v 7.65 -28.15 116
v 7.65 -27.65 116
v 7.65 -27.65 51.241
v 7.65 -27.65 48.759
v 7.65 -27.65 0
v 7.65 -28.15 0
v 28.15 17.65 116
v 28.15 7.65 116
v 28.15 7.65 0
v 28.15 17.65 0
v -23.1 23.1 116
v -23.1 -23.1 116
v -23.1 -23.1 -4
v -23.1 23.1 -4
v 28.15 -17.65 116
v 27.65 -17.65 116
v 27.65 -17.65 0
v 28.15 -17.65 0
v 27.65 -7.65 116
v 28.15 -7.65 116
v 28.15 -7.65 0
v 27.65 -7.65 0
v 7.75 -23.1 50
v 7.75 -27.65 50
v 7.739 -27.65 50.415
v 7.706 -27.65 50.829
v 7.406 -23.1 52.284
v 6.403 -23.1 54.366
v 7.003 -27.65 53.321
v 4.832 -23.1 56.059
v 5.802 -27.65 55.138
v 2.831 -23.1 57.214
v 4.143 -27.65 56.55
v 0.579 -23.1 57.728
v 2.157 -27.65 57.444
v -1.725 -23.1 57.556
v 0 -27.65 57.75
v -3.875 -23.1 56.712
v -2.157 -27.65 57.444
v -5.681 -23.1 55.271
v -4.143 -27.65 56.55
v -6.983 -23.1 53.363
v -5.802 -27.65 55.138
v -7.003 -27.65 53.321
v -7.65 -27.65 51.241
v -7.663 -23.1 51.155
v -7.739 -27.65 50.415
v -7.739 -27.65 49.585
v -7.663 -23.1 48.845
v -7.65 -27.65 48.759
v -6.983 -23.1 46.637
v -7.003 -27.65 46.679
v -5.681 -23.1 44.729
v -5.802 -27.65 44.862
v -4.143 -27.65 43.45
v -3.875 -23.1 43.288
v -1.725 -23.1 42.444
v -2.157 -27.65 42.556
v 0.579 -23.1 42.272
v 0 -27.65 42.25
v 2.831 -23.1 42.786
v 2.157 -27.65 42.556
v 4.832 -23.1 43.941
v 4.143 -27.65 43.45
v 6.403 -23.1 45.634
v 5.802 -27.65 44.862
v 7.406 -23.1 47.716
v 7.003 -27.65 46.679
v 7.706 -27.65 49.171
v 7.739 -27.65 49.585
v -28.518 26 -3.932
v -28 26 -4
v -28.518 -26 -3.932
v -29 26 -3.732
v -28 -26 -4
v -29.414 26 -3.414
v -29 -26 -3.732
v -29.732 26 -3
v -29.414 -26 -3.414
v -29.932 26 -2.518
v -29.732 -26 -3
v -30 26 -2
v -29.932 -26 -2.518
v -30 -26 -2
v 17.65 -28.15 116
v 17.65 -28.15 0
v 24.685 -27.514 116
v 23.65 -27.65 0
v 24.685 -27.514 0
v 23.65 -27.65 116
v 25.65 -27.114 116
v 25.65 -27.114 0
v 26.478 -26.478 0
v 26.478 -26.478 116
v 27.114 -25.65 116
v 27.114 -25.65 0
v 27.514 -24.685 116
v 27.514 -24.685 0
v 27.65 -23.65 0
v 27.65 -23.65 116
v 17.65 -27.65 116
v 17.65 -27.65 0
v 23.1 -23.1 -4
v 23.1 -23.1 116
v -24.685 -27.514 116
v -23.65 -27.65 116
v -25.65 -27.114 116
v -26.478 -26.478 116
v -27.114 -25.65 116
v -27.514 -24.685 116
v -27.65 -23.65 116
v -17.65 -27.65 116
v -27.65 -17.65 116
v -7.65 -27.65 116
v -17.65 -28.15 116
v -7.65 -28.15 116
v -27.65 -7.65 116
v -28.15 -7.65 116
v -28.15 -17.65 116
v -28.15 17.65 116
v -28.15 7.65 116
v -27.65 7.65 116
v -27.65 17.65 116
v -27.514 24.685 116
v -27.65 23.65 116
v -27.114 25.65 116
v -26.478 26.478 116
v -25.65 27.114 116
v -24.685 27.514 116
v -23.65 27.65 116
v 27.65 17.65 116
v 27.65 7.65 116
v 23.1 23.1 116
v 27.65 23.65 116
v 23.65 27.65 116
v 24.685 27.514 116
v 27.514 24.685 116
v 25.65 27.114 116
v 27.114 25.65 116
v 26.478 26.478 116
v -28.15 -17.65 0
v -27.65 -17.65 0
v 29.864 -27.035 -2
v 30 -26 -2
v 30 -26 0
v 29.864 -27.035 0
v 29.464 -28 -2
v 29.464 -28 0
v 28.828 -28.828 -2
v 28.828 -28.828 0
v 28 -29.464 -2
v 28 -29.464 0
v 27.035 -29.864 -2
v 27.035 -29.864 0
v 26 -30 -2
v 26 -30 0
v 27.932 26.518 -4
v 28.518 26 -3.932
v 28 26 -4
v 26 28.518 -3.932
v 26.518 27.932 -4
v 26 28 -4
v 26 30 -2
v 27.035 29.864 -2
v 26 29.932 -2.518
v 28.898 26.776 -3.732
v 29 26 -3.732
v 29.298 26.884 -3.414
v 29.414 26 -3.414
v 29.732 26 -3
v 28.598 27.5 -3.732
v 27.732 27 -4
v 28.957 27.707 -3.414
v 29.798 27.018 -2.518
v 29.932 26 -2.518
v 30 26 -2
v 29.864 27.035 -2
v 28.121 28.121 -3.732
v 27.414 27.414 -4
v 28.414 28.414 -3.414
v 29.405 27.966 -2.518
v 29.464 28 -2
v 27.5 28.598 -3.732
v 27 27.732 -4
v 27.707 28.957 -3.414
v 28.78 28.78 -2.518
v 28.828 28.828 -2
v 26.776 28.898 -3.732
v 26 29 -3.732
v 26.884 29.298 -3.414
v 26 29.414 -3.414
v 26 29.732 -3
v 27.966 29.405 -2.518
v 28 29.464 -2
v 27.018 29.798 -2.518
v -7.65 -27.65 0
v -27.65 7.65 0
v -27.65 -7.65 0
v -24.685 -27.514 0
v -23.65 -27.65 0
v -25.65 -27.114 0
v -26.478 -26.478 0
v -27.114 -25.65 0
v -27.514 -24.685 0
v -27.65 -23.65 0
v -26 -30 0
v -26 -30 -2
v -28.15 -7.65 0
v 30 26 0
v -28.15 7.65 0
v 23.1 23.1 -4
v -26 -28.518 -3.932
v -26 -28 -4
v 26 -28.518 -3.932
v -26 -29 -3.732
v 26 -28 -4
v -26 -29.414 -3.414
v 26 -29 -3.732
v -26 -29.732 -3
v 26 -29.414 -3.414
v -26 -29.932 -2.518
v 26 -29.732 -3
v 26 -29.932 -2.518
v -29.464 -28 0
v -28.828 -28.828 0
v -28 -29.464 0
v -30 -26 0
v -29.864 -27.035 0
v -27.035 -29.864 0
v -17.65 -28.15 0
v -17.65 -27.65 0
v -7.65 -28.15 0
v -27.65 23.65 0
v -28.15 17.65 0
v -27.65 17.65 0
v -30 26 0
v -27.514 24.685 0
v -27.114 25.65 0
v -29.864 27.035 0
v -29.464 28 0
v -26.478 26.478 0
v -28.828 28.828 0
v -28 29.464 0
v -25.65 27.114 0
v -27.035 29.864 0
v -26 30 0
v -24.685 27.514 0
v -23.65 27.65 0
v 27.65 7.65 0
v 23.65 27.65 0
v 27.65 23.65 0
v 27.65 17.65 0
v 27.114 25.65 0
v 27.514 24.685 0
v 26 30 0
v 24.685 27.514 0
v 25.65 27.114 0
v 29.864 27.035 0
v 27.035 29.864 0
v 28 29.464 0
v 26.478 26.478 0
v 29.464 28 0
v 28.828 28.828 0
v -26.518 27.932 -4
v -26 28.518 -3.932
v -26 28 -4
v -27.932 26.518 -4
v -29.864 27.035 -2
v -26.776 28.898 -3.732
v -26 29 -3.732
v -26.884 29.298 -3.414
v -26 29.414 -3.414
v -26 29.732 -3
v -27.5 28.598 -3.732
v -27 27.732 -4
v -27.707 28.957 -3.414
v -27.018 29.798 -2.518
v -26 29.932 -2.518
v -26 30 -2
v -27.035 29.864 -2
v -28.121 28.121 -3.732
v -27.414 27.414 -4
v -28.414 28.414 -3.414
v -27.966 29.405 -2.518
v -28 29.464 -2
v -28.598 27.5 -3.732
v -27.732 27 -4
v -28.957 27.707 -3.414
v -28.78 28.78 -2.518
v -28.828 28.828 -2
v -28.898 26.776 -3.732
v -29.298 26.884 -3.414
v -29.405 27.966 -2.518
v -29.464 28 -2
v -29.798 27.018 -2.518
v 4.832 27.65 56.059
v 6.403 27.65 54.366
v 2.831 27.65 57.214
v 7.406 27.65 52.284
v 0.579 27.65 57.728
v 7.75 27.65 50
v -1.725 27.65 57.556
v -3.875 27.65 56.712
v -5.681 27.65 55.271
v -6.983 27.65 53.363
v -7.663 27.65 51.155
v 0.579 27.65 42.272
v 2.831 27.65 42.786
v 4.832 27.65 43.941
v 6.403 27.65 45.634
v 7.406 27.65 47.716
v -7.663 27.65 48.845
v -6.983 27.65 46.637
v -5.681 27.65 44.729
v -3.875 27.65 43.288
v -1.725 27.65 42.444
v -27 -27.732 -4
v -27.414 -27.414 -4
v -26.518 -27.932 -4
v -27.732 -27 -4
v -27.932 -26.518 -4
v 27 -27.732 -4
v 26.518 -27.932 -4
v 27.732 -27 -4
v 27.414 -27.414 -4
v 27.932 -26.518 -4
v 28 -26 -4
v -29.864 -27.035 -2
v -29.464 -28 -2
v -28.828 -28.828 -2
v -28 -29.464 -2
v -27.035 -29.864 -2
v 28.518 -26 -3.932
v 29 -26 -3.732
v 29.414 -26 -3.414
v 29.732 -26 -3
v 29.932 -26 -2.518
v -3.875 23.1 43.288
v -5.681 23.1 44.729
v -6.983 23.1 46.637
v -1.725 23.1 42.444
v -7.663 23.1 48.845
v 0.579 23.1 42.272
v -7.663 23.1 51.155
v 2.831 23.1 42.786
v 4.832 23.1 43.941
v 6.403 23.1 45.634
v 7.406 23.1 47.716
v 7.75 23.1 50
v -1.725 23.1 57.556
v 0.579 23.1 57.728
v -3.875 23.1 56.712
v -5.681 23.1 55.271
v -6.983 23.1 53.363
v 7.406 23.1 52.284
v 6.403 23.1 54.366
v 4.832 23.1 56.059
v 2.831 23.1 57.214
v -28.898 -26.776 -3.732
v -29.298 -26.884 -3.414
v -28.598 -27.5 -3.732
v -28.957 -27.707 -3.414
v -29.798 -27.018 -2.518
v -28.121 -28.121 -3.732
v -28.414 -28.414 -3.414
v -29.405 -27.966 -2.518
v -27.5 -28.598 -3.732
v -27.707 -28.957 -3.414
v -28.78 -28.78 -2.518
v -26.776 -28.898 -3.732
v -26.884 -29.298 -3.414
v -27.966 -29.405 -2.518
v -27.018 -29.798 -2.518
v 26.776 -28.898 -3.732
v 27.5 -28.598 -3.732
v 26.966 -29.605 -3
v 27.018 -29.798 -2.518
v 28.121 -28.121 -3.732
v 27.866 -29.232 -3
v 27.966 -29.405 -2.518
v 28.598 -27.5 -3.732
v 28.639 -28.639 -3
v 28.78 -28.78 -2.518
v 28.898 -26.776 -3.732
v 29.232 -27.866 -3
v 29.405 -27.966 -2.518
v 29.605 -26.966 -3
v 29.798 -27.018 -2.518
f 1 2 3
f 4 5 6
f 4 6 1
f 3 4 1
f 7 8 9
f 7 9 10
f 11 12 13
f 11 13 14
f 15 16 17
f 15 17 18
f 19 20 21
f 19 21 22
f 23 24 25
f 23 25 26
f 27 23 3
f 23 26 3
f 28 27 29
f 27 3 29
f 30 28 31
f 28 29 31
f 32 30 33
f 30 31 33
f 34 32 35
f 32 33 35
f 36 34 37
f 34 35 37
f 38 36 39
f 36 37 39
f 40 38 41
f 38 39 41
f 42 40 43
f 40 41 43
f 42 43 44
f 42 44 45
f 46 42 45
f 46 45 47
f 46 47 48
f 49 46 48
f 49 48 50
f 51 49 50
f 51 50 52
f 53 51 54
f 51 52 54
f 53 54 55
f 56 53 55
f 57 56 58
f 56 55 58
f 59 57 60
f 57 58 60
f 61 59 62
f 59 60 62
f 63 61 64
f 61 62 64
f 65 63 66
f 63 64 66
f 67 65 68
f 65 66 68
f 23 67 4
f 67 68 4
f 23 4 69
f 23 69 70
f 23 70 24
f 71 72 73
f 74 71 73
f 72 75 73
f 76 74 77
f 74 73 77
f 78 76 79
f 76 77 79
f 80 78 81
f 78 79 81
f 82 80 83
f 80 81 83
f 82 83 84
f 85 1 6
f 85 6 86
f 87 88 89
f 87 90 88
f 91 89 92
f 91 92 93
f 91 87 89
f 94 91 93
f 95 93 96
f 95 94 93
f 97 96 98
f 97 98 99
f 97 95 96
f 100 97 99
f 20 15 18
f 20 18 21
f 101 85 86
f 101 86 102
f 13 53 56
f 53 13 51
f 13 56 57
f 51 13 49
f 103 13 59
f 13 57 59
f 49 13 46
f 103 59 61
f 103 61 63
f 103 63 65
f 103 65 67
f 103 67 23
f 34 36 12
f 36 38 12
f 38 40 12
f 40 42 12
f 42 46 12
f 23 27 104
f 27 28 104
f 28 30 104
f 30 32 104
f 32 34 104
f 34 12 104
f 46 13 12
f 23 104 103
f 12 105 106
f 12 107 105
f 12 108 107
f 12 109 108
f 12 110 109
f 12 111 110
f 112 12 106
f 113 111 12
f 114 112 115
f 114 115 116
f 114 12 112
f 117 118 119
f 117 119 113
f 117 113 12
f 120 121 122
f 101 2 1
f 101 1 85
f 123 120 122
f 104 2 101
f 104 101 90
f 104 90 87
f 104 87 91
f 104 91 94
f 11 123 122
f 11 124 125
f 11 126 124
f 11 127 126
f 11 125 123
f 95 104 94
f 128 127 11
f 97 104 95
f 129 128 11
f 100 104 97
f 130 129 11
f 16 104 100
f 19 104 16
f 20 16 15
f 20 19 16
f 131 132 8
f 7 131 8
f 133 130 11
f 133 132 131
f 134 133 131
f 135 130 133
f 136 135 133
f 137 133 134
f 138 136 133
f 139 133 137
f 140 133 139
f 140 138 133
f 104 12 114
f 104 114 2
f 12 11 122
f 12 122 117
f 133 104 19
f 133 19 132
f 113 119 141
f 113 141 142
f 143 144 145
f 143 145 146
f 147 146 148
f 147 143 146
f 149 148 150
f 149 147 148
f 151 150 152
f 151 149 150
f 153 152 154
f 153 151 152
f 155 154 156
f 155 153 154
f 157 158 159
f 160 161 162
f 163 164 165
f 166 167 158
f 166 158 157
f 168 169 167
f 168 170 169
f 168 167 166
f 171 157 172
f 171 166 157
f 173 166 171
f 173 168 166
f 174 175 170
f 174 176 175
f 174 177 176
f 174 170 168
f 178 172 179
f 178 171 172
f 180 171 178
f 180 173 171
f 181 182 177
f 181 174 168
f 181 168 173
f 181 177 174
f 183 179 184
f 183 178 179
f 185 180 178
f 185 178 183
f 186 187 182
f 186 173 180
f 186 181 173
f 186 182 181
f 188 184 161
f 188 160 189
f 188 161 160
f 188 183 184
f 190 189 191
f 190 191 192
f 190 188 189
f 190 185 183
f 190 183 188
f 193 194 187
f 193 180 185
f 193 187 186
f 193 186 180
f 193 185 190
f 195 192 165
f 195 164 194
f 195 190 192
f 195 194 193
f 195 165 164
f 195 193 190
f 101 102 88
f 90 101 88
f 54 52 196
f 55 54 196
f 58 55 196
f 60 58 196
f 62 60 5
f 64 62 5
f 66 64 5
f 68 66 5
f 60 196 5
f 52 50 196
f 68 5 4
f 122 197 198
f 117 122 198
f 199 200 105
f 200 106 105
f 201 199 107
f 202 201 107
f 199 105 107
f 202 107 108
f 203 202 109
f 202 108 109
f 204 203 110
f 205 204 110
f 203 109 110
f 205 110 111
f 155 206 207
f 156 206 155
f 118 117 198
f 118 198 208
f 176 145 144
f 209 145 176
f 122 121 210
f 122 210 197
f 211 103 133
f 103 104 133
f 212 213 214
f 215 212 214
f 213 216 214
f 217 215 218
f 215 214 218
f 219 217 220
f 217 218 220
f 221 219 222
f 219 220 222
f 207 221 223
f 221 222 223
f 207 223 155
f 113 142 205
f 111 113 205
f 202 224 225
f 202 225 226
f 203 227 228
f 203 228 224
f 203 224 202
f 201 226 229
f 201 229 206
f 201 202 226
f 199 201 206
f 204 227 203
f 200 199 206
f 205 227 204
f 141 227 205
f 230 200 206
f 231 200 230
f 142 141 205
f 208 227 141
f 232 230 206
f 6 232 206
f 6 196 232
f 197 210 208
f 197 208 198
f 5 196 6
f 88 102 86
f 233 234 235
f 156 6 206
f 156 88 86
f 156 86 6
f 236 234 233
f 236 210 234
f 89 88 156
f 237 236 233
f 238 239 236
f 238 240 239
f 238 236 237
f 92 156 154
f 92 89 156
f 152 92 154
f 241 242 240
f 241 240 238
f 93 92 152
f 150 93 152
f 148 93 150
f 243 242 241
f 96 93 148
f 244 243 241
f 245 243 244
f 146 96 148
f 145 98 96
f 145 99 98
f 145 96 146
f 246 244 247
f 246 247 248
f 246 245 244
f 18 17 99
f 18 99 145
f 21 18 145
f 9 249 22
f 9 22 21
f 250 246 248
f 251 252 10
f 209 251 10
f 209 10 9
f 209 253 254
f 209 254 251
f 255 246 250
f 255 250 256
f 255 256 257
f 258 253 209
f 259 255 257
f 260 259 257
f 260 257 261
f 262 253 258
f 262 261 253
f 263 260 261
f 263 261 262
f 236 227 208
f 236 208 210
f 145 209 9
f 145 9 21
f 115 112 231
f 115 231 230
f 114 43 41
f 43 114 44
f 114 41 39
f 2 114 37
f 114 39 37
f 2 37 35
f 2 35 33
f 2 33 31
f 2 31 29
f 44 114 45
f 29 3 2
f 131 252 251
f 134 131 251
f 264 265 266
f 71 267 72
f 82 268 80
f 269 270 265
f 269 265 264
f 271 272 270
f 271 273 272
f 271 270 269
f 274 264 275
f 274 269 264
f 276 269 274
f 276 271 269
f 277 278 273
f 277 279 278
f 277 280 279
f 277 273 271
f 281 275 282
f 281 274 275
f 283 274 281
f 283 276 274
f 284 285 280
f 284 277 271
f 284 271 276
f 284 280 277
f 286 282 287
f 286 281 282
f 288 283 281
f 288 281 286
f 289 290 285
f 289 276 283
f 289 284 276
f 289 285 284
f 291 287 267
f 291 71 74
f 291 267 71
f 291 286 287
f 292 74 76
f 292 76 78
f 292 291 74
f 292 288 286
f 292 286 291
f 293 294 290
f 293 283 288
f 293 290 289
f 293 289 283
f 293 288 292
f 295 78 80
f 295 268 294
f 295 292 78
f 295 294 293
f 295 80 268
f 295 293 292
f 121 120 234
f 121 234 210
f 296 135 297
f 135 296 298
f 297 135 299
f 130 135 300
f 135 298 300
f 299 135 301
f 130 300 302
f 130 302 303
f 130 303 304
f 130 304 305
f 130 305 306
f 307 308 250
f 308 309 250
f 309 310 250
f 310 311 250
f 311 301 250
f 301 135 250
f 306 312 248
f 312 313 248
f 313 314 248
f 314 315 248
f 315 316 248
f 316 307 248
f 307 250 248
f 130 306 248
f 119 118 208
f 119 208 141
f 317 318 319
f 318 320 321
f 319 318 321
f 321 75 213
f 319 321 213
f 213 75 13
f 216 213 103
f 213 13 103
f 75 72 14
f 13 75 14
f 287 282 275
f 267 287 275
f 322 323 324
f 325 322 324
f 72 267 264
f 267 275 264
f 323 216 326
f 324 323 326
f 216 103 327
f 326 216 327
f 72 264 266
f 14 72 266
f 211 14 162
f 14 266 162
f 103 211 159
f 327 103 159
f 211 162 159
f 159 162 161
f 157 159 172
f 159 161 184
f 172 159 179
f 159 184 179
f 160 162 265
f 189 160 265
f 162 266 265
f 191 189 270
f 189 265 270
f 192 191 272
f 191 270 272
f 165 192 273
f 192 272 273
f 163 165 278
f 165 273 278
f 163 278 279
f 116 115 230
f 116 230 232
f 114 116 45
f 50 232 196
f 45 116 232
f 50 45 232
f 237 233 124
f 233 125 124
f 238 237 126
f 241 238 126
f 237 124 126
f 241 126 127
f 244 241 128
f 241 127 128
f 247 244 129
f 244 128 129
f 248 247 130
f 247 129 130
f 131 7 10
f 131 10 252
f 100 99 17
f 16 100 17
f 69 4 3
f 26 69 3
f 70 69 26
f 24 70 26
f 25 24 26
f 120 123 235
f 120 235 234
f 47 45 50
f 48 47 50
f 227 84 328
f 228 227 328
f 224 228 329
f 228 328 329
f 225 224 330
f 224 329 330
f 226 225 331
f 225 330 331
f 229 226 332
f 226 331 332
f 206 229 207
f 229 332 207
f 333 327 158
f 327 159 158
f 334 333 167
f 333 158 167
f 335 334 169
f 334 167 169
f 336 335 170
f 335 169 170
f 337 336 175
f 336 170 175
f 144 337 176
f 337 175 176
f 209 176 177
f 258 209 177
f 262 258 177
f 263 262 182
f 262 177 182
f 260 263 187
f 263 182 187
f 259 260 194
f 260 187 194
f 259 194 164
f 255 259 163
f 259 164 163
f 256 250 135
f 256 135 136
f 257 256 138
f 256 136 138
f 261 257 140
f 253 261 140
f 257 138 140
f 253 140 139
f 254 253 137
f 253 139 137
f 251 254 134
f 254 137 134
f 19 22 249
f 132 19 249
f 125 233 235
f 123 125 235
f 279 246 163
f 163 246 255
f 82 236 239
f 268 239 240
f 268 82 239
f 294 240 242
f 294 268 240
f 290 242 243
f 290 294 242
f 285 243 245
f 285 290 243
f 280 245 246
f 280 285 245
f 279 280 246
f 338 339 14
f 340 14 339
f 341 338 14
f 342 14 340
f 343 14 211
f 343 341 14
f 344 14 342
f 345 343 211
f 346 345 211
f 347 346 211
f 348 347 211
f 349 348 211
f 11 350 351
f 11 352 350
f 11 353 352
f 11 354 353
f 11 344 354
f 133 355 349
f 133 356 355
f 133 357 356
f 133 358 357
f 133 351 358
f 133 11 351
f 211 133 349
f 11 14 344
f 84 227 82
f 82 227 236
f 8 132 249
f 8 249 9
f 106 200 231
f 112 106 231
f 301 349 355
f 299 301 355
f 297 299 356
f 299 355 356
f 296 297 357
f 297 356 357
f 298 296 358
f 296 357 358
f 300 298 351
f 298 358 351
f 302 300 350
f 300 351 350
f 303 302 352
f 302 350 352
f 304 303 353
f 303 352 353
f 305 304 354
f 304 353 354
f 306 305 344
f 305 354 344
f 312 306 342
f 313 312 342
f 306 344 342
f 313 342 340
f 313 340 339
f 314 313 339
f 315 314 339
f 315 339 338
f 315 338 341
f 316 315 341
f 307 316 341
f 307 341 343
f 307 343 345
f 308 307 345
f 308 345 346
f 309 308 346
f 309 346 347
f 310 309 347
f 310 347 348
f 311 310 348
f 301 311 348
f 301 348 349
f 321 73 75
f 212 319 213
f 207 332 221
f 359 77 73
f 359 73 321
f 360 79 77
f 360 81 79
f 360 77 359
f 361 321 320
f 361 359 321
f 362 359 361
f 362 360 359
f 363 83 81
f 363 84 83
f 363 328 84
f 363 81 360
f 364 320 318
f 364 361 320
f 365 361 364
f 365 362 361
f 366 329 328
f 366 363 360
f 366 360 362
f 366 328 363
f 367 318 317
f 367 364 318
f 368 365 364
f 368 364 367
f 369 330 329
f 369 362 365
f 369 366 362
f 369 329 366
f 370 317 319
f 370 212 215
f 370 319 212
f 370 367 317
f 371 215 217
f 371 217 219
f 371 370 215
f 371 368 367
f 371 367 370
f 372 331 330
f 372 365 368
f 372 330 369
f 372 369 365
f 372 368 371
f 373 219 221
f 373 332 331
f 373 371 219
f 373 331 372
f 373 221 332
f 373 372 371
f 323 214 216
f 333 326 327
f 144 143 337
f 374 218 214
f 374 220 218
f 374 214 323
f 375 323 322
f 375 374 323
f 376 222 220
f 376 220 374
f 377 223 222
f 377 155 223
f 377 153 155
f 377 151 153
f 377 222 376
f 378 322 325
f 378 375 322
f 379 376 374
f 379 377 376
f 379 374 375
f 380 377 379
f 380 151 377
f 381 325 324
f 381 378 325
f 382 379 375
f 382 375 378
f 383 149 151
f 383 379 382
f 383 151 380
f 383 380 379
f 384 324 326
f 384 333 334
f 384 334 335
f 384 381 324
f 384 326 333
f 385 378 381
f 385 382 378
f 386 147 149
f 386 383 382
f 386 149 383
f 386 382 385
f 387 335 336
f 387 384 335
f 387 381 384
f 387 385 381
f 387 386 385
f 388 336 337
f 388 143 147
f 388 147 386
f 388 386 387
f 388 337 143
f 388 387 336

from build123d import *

# Parameters (mm, degrees)
F0_W     = 46.2
F0_H     = 46.2
F1_DEPTH = 116
F0_W_2   = 60
F0_H_2   = 60
F2_DEPTH = 4
F3_R     = 4
F4_R     = 2
F6_R     = 7.75
F7_DEPTH = 80


with BuildPart() as f1:
    # F0 (on Top) → F1 (new body)
    with BuildSketch(Plane.XY):
        Polygon((27.65, 17.65), (27.65, 27.65), (-27.65, 27.65), (-27.65, 17.65), (-28.15, 17.65), (-28.15, 7.65), (-27.65, 7.65), (-27.65, -7.65), (-28.15, -7.65), (-28.15, -17.65), (-27.65, -17.65), (-27.65, -27.65), (-17.65, -27.65), (-17.65, -28.15), (-7.65, -28.15), (-7.65, -27.65), (7.65, -27.65), (7.65, -28.15), (17.65, -28.15), (17.65, -27.65), (27.65, -27.65), (27.65, -17.65), (28.15, -17.65), (28.15, -7.65), (27.65, -7.65), (27.65, 7.65), (28.15, 7.65), (28.15, 17.65), align=None)
        Rectangle(F0_W, F0_H, mode=Mode.SUBTRACT)
    extrude(amount=F1_DEPTH)

    # F0 (on Top) → F2 (join)
    with BuildSketch(Plane.XY):
        Rectangle(F0_W_2, F0_H_2)
        Polygon((-27.65, 27.65), (27.65, 27.65), (27.65, 17.65), (28.15, 17.65), (28.15, 7.65), (27.65, 7.65), (27.65, -7.65), (28.15, -7.65), (28.15, -17.65), (27.65, -17.65), (27.65, -27.65), (17.65, -27.65), (17.65, -28.15), (7.65, -28.15), (7.65, -27.65), (-7.65, -27.65), (-7.65, -28.15), (-17.65, -28.15), (-17.65, -27.65), (-27.65, -27.65), (-27.65, -17.65), (-28.15, -17.65), (-28.15, -7.65), (-27.65, -7.65), (-27.65, 7.65), (-28.15, 7.65), (-28.15, 17.65), (-27.65, 17.65), align=None, mode=Mode.SUBTRACT)
        Polygon((27.65, 17.65), (27.65, 27.65), (-27.65, 27.65), (-27.65, 17.65), (-28.15, 17.65), (-28.15, 7.65), (-27.65, 7.65), (-27.65, -7.65), (-28.15, -7.65), (-28.15, -17.65), (-27.65, -17.65), (-27.65, -27.65), (-17.65, -27.65), (-17.65, -28.15), (-7.65, -28.15), (-7.65, -27.65), (7.65, -27.65), (7.65, -28.15), (17.65, -28.15), (17.65, -27.65), (27.65, -27.65), (27.65, -17.65), (28.15, -17.65), (28.15, -7.65), (27.65, -7.65), (27.65, 7.65), (28.15, 7.65), (28.15, 17.65), align=None)
        Rectangle(F0_W, F0_H, mode=Mode.SUBTRACT)
    extrude(amount=-F2_DEPTH)

    # F3
    f3_edges = [f1.edges().sort_by_distance(p)[0] for p in [
        (-27.65, 27.65, 58),
        (-27.65, -27.65, 58),
        (27.65, -27.65, 58),
        (27.65, 27.65, 58),
        (30, 30, -2),
        (30, -30, -2),
        (-30, 30, -2),
        (-30, -30, -2),
    ]]
    fillet(f3_edges, radius=F3_R)

    # F4
    f4_edges = [f1.edges().sort_by_distance(p)[0] for p in [
        (30, 0, -4),
    ]]
    fillet(f4_edges, radius=F4_R)

    # F6 (on offset) → F7 (cut)
    with BuildSketch(Plane.XZ.offset(27.65)):
        with Locations((0, 50)):
            Circle(F6_R)
    extrude(amount=-F7_DEPTH, mode=Mode.SUBTRACT)


solid = f1.part
